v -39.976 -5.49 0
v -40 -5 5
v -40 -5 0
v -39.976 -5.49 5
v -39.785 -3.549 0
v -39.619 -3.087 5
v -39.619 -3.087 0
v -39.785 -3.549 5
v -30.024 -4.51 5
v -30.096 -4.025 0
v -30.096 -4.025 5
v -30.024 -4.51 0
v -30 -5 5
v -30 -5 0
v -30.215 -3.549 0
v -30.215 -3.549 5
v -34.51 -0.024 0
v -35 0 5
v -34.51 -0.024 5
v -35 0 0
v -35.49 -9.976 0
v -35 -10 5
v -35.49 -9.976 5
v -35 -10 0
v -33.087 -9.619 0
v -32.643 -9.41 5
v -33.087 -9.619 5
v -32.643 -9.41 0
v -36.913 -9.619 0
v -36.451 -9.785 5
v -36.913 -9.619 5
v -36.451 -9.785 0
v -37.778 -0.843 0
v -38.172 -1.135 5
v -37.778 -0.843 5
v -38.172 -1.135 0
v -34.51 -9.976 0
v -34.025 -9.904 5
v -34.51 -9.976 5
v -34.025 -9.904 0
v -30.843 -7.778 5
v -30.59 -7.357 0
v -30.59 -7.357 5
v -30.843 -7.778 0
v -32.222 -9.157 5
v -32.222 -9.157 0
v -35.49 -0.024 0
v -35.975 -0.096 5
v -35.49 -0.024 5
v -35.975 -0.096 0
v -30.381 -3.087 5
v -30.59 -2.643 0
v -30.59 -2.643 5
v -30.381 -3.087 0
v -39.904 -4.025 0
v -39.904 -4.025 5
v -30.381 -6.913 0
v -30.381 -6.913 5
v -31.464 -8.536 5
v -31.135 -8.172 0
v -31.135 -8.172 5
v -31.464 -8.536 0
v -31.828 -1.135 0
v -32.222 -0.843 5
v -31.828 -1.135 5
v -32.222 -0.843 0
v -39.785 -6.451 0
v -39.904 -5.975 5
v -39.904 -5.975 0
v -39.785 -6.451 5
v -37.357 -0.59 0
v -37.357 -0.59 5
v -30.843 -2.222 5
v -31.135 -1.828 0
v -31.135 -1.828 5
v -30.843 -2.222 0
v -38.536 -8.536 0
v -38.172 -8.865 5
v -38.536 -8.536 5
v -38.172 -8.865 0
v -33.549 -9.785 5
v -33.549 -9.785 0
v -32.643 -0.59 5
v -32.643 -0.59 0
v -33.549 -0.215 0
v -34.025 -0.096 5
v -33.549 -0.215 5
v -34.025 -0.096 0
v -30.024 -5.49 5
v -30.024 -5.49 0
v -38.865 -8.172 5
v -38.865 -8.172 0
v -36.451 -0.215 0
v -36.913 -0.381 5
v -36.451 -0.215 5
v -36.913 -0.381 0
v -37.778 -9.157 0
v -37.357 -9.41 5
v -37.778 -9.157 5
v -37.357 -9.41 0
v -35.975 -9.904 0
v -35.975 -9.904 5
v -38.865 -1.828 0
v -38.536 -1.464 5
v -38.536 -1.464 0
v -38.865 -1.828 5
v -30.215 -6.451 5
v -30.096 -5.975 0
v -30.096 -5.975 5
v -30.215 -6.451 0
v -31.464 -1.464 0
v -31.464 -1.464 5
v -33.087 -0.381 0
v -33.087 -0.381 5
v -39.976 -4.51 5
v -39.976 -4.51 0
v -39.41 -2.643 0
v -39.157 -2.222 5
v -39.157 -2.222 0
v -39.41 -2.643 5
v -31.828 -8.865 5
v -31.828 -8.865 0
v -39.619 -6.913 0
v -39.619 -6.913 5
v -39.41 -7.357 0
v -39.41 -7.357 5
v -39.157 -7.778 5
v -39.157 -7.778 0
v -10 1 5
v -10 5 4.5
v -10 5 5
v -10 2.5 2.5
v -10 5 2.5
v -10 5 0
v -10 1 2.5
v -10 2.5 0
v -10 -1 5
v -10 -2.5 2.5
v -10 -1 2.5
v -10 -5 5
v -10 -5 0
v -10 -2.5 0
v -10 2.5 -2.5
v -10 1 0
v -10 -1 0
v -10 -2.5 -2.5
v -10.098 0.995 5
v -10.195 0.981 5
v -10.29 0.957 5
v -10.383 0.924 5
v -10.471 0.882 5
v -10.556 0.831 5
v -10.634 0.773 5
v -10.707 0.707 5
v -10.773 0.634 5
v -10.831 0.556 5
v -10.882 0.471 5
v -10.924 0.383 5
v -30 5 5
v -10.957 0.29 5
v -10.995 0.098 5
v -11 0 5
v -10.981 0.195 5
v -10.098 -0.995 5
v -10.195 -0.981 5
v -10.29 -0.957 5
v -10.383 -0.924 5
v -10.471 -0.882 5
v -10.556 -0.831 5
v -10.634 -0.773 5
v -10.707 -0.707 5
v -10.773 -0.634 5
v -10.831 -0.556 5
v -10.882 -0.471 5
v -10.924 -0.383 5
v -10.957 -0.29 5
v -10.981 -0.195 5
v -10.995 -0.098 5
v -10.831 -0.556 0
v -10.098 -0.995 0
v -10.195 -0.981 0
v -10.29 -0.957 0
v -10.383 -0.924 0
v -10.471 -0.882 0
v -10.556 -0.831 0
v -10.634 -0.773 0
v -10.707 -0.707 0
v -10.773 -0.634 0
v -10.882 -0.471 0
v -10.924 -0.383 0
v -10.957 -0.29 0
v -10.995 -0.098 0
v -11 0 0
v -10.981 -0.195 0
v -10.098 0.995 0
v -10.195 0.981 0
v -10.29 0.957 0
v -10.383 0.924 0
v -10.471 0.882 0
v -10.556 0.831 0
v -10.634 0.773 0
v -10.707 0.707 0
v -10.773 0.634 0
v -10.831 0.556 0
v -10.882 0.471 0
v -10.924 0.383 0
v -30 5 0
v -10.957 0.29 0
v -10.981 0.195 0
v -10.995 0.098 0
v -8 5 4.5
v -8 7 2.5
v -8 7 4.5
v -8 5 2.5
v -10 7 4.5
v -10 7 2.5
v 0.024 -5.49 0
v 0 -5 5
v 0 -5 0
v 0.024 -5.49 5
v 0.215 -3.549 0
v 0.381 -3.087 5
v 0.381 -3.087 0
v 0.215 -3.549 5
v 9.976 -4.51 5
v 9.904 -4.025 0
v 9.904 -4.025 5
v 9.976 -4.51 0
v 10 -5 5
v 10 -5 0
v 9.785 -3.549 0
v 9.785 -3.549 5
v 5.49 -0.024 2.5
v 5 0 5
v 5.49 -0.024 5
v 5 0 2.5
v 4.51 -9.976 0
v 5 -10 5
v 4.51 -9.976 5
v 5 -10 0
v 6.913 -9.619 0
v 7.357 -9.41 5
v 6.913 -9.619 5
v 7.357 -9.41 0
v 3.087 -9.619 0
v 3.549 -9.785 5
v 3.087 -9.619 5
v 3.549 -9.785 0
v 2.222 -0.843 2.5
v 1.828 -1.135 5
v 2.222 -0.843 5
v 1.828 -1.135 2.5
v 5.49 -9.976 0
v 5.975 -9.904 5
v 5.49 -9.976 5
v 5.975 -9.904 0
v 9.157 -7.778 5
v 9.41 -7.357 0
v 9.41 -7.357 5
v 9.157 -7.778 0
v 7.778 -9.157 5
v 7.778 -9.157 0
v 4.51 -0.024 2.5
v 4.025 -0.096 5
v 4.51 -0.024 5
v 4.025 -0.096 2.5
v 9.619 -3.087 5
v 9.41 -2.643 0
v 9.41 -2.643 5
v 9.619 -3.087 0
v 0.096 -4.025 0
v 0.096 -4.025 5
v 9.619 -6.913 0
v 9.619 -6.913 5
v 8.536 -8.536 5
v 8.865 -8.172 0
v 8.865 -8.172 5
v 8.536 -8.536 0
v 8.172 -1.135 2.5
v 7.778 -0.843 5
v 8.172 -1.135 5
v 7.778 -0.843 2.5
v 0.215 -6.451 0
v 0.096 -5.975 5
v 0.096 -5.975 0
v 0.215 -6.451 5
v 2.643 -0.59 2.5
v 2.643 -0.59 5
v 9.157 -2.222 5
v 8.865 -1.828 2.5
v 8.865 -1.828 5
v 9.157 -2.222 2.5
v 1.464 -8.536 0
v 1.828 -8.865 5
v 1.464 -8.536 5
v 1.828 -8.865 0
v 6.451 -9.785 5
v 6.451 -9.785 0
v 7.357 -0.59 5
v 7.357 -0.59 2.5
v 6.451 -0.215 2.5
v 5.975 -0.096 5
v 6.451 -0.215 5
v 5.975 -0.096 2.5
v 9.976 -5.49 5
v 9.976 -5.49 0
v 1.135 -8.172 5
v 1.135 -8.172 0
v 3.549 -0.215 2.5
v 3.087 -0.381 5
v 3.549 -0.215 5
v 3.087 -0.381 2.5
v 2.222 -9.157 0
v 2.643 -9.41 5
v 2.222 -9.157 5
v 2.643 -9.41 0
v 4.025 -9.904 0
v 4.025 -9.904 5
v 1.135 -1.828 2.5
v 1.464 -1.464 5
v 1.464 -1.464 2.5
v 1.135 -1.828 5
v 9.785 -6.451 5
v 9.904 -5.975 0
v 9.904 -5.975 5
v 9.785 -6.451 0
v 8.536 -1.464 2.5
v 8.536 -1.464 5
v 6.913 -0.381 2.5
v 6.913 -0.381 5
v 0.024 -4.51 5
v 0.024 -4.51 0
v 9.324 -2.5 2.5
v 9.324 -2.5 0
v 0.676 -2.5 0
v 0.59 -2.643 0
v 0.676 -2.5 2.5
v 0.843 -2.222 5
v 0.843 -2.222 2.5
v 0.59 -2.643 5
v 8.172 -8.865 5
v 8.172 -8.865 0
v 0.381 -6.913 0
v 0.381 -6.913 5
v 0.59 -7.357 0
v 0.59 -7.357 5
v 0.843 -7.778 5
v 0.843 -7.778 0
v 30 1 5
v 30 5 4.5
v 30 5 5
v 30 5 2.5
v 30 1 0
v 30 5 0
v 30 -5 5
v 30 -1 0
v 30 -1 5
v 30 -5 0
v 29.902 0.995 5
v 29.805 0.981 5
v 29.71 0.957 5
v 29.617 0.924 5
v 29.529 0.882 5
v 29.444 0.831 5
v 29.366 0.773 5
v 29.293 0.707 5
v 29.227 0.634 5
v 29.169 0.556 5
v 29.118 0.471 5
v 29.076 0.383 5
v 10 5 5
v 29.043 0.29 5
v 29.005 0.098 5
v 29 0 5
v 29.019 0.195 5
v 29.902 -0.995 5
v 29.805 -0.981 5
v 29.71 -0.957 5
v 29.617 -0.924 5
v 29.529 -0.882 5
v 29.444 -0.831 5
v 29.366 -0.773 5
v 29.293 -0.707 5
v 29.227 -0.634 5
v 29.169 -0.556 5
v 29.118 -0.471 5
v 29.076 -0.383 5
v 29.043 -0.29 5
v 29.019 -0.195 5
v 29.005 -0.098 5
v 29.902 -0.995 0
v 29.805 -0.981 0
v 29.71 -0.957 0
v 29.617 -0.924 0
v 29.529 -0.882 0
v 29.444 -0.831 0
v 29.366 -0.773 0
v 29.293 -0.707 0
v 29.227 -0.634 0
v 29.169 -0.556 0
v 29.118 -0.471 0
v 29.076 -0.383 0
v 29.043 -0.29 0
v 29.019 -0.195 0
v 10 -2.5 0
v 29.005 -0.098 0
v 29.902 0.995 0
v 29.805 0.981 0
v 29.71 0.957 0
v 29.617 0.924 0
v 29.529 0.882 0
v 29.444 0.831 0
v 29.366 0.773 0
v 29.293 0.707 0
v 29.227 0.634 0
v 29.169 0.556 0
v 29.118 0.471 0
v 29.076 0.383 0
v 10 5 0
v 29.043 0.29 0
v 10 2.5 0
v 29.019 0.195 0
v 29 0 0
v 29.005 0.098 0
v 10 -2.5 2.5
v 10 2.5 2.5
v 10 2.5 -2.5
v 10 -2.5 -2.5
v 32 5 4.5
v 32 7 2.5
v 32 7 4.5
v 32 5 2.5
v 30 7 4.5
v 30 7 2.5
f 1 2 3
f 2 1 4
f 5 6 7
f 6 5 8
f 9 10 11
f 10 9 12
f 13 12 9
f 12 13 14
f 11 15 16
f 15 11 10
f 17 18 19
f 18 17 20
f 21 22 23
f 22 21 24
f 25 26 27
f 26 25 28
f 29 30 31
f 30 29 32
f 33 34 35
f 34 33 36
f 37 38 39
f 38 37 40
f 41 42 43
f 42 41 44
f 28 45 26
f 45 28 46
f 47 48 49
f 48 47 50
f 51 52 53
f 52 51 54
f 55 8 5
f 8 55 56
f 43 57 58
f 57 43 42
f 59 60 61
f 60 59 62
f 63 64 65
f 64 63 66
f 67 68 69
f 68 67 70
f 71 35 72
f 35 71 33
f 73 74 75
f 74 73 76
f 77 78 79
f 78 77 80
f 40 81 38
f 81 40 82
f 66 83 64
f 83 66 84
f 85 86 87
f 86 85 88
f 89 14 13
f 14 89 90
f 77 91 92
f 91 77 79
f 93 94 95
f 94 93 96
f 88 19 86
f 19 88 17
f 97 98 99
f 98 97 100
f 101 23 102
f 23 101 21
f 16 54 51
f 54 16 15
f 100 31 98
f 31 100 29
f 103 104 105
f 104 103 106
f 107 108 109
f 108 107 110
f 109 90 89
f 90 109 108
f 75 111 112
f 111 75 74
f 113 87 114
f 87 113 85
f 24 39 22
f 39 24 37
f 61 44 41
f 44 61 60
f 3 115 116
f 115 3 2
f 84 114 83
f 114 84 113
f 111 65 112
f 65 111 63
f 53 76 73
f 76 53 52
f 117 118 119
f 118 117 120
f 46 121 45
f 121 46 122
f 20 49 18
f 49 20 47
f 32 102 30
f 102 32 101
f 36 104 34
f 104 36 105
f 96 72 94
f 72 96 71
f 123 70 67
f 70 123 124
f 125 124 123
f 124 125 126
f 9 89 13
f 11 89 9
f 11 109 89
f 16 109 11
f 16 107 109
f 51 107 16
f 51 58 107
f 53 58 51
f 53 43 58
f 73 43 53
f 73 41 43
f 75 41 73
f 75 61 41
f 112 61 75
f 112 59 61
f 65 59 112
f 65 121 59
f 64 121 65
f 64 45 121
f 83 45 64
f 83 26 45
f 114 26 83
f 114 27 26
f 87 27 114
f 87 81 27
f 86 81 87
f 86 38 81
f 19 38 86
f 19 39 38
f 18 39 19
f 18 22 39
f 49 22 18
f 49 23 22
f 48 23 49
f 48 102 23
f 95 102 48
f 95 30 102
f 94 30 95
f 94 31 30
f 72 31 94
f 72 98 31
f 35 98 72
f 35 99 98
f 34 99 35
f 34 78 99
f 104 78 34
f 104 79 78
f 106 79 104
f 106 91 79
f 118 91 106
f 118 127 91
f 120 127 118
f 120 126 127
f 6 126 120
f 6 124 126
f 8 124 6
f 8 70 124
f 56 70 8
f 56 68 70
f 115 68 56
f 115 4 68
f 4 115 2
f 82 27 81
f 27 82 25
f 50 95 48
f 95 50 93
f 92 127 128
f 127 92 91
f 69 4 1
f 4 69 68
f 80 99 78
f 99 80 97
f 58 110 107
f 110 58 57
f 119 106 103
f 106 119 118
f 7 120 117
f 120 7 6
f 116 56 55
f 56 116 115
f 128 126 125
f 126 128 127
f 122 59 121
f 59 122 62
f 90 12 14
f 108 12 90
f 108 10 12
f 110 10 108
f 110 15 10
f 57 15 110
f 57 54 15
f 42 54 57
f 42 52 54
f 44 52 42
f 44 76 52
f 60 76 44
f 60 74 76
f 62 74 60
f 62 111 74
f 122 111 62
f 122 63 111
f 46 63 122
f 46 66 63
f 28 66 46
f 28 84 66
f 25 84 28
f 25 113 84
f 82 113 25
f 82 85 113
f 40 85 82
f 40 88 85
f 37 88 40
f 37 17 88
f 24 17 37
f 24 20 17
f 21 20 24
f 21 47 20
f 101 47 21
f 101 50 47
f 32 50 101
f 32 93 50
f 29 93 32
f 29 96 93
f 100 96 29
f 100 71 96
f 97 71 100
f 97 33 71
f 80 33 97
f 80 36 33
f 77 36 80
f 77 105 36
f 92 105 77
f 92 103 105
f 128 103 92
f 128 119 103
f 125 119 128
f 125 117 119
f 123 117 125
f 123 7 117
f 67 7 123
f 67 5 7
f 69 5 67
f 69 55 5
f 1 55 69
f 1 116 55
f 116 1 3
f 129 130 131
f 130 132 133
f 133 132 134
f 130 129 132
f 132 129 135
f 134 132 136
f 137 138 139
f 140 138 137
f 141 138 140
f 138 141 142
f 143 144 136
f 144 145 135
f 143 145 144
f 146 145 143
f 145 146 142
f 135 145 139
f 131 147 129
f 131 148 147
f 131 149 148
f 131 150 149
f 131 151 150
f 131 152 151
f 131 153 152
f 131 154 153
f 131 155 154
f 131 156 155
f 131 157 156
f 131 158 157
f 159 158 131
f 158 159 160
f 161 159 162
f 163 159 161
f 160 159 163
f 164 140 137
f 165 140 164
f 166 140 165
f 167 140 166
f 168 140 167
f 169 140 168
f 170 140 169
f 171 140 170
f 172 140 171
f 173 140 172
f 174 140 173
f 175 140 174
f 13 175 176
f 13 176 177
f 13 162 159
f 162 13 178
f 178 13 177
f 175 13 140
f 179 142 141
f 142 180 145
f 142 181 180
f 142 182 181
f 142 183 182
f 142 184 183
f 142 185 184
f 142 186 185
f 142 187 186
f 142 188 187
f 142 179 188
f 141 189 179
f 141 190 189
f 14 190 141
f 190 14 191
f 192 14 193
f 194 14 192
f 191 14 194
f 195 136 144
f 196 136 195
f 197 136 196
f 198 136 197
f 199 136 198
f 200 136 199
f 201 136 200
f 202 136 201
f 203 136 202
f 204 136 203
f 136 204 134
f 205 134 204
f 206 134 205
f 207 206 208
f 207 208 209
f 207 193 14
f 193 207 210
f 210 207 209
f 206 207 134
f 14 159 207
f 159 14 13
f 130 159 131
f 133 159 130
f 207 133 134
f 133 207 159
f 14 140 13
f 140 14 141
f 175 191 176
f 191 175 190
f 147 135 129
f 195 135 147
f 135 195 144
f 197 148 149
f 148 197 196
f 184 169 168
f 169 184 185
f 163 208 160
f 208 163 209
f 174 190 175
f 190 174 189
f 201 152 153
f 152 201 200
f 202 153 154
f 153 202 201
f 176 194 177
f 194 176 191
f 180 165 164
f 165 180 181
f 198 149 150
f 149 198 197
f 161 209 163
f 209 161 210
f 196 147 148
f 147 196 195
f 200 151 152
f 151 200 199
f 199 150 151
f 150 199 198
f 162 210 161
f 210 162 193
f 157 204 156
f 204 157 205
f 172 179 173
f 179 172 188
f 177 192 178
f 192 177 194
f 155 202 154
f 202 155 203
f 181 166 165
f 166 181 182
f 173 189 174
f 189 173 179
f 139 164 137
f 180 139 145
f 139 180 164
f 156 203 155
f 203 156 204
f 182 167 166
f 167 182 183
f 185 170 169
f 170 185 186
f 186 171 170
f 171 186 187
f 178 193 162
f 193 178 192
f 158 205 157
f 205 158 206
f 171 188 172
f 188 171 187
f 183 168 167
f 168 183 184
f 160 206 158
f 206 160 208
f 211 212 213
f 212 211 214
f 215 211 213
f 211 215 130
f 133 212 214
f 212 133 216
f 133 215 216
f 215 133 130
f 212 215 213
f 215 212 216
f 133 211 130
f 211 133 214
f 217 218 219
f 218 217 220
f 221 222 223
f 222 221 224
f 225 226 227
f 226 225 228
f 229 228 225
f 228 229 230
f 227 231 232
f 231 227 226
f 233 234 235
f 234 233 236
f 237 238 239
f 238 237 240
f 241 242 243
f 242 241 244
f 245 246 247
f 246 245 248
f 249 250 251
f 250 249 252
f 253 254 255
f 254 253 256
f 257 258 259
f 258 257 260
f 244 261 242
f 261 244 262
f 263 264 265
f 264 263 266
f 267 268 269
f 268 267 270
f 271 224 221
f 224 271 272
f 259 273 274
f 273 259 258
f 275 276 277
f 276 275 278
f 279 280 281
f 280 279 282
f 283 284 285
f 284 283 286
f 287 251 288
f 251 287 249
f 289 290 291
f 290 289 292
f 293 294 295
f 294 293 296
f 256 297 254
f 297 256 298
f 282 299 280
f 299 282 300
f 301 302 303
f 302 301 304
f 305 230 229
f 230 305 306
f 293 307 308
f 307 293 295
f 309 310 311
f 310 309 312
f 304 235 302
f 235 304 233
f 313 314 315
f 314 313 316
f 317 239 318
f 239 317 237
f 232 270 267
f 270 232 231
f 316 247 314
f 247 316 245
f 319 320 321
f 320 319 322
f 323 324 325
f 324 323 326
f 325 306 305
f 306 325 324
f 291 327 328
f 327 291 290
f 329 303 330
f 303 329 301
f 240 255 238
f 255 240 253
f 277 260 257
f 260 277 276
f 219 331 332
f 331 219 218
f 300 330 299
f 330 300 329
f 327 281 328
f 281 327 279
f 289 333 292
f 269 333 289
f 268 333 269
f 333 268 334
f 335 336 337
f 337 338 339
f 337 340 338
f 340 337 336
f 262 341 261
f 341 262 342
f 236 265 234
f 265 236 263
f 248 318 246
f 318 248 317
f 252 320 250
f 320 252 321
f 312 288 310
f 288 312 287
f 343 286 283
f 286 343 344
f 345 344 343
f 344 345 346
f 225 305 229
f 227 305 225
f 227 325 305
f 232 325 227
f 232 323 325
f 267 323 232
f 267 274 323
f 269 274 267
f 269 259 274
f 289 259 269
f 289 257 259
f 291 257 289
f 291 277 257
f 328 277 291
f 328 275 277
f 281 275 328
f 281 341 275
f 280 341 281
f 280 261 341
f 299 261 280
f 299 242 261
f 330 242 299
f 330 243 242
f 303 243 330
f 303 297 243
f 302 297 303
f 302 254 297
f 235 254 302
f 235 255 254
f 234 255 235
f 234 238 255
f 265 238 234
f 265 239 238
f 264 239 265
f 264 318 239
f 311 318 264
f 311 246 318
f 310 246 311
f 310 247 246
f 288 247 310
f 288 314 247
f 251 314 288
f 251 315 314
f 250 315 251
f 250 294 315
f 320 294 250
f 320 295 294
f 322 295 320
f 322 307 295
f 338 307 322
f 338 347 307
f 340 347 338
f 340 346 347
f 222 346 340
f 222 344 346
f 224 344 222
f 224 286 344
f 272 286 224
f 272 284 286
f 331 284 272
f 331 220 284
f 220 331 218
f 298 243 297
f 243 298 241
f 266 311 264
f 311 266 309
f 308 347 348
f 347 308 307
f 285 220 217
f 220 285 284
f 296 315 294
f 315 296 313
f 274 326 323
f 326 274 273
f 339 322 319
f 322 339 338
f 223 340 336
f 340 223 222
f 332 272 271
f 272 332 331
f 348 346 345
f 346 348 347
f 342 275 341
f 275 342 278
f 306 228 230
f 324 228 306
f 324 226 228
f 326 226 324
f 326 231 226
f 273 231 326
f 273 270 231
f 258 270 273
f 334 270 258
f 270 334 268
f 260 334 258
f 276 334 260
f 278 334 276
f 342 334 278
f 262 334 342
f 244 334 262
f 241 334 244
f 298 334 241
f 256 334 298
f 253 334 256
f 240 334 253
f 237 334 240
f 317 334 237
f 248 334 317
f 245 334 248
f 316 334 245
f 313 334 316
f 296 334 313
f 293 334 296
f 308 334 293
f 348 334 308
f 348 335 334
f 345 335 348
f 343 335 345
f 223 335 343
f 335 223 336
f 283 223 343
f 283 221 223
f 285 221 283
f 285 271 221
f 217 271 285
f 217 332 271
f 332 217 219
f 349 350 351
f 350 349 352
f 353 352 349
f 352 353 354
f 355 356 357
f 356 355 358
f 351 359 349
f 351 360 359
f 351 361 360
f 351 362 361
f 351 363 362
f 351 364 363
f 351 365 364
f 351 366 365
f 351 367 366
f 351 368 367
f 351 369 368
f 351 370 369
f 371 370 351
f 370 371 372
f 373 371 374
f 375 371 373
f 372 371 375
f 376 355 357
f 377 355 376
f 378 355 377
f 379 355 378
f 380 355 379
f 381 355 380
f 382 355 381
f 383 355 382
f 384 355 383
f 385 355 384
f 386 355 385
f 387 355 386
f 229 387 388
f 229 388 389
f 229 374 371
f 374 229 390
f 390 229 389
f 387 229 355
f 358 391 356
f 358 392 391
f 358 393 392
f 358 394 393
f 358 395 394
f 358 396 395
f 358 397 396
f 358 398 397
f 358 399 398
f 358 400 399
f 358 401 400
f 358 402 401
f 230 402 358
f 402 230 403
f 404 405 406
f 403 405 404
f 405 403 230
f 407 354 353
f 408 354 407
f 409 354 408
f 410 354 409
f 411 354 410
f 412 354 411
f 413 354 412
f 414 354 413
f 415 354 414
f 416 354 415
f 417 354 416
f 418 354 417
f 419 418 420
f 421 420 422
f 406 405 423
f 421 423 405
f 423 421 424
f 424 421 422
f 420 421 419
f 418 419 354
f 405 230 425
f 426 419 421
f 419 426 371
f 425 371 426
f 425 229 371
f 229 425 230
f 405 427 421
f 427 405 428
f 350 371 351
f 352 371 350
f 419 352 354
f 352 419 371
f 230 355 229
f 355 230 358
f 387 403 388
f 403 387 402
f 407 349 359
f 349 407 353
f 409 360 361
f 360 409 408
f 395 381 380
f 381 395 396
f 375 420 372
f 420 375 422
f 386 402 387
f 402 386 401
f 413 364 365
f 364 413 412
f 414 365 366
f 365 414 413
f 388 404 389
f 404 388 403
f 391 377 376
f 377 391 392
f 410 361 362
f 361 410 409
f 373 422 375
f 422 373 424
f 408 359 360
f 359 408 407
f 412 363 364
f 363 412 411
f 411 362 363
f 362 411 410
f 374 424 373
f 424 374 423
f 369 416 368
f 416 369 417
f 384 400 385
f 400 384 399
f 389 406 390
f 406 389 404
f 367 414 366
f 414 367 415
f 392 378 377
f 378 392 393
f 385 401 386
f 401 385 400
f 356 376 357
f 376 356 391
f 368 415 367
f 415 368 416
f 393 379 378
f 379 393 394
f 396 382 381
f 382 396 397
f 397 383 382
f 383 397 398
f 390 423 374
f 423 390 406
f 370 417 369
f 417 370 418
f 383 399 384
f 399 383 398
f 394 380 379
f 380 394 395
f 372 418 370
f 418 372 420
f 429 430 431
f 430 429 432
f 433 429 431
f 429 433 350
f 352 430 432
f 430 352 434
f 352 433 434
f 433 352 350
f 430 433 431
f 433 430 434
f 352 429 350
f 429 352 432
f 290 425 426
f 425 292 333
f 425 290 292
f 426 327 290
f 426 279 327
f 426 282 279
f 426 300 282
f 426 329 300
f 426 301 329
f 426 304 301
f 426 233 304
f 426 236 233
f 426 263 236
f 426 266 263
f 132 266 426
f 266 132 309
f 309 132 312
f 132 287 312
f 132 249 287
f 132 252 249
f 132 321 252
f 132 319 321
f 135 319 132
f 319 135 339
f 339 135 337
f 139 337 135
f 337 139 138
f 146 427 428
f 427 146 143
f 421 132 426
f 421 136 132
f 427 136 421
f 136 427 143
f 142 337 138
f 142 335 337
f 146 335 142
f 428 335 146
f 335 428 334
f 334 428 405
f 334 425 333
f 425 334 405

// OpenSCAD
module flange() {
    difference() {
        union() {
            translate([-15, -5, 0])
                scale([1, 1, 0.5])
                    cylinder(h=10, r=5, $fn=64);
            translate([-10, -5, 0])
                cube([20, 10, 5]);
        }
        translate([10, 0, 0])
            cylinder(h=10, r=1, $fn=64);
    }
    translate([10, 5, 2.5])
        cube([2, 2, 2]);
}

module web() {
    translate([-10, -2.5, -2.5])
        cube([20, 5, 5]);
}

module bracket() {
    union() {
        translate([-20, 0, 0])
            flange();
        translate([0, 0, 0])
            web();
        translate([20, 0, 0])
            flange();
    }
}

bracket();
